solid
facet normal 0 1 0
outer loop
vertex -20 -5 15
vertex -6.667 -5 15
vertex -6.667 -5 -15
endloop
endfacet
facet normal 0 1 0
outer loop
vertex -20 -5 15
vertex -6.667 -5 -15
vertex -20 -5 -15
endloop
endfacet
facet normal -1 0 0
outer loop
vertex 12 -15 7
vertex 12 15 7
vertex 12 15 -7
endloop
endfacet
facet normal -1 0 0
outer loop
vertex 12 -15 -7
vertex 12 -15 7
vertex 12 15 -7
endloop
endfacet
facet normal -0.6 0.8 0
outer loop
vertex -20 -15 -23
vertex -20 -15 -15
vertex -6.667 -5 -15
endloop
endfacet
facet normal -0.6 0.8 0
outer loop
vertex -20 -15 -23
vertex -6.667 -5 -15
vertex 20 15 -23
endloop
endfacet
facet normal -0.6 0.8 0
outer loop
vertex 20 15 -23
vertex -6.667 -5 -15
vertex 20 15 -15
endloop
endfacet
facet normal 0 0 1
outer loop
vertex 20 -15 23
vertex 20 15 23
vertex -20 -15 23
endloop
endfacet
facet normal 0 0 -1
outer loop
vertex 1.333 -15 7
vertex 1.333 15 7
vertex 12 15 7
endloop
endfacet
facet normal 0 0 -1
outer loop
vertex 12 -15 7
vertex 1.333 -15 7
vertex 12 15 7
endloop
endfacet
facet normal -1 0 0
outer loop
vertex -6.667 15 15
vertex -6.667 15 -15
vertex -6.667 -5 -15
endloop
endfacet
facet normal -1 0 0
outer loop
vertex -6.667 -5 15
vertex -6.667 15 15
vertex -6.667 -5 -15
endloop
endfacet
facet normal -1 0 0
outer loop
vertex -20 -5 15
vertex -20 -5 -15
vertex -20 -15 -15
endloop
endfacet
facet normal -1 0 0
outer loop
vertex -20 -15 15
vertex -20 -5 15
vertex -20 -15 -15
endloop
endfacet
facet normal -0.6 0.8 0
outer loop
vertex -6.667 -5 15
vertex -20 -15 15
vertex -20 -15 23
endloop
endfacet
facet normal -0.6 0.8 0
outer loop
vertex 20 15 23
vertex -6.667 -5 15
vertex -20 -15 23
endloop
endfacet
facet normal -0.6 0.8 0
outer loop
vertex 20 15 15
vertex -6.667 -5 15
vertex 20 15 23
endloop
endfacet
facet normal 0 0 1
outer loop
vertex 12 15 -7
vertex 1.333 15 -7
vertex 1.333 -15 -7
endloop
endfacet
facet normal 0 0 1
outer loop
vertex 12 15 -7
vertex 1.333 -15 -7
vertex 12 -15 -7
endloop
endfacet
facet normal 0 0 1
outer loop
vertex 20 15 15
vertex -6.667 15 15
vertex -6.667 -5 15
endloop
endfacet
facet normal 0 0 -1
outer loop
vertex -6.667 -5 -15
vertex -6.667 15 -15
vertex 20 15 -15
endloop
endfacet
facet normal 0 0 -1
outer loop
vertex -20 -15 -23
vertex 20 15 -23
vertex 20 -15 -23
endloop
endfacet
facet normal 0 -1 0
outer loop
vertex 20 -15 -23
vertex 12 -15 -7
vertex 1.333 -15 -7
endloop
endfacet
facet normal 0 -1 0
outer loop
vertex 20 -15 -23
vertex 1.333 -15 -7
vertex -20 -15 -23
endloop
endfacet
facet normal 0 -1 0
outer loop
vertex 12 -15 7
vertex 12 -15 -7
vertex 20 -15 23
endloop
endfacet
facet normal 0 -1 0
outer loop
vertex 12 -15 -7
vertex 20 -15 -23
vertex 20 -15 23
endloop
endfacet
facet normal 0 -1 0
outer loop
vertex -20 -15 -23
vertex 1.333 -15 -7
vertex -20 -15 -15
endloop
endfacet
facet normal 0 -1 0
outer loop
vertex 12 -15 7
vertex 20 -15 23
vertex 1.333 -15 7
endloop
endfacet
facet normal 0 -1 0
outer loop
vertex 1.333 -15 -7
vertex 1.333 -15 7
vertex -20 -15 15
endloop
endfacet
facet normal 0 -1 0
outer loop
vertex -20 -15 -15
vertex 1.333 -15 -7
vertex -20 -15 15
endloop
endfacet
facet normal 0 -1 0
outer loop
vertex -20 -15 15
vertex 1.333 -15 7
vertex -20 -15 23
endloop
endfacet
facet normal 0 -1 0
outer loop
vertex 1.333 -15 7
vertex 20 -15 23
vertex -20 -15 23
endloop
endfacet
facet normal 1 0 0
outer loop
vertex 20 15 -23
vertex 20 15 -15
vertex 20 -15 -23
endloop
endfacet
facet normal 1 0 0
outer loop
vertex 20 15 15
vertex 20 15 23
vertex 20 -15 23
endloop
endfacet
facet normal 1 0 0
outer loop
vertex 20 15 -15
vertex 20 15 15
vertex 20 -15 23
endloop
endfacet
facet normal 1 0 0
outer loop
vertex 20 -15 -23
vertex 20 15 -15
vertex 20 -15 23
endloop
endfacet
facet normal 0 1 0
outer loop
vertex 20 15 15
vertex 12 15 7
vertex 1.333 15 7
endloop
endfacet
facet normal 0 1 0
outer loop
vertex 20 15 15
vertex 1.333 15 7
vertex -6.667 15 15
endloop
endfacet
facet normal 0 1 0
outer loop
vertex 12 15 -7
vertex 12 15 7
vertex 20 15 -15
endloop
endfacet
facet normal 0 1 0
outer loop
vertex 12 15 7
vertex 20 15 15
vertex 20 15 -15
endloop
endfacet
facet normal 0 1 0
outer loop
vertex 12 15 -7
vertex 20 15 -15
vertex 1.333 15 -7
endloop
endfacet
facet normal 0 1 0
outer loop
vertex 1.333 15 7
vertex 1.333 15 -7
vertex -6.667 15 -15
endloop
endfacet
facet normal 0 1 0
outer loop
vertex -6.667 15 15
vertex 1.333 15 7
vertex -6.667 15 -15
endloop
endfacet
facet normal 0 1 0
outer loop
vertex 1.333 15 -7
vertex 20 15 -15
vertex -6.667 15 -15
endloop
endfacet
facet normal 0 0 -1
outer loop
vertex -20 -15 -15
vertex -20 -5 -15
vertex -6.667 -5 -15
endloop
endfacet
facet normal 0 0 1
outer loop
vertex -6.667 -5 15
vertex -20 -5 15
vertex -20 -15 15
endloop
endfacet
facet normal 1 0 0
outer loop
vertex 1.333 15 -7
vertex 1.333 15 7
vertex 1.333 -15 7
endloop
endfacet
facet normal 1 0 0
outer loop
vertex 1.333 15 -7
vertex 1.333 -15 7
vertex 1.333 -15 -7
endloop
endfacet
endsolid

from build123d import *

# Parameters (mm, degrees)
EXTRUDE_1_DEPTH      = 15
EXTRUDE_1_DEPTH_BACK = 15
EXTRUDE_2_DEPTH      = 8
SKETCH_3_W           = 10.666666667
SKETCH_3_H           = 14
CUT_EXTRUDE_1_DEPTH  = 43.766809561


with BuildPart() as part:
    # Эскиз1 → Бобышка-Вытянуть1 (new, two sides: drawn at the far end of the back side and taken through both)
    with BuildSketch(Plane.XY.offset(-EXTRUDE_1_DEPTH_BACK)):
        Polygon((-6.666666667, -5), (-20, -5), (-20, -15), (20, -15), (20, 15), (-6.666666667, 15), align=None)
    extrude(amount=EXTRUDE_1_DEPTH + EXTRUDE_1_DEPTH_BACK)

    # Эскиз2 → Бобышка-Вытянуть2 (add)
    with BuildSketch(Plane.XY.offset(15)):
        Polygon((-20, -15), (20, 15), (20, -15), align=None)
    extrude_2 = extrude(amount=EXTRUDE_2_DEPTH)

    # Зеркальное отражение1: Бобышка-Вытянуть2 across plane
    add(extrude_2.mirror(Plane.XY))

    # Эскиз3 → Вырез-Вытянуть1 (cut, through all)
    with BuildSketch(Plane(origin=(0, 15, 0), x_dir=(1, 0, 0), z_dir=(0, 1, 0))):
        with Locations((6.666666667, 0)):
            Rectangle(SKETCH_3_W, SKETCH_3_H)
    extrude(amount=-CUT_EXTRUDE_1_DEPTH, mode=Mode.SUBTRACT)


solid = part.part
